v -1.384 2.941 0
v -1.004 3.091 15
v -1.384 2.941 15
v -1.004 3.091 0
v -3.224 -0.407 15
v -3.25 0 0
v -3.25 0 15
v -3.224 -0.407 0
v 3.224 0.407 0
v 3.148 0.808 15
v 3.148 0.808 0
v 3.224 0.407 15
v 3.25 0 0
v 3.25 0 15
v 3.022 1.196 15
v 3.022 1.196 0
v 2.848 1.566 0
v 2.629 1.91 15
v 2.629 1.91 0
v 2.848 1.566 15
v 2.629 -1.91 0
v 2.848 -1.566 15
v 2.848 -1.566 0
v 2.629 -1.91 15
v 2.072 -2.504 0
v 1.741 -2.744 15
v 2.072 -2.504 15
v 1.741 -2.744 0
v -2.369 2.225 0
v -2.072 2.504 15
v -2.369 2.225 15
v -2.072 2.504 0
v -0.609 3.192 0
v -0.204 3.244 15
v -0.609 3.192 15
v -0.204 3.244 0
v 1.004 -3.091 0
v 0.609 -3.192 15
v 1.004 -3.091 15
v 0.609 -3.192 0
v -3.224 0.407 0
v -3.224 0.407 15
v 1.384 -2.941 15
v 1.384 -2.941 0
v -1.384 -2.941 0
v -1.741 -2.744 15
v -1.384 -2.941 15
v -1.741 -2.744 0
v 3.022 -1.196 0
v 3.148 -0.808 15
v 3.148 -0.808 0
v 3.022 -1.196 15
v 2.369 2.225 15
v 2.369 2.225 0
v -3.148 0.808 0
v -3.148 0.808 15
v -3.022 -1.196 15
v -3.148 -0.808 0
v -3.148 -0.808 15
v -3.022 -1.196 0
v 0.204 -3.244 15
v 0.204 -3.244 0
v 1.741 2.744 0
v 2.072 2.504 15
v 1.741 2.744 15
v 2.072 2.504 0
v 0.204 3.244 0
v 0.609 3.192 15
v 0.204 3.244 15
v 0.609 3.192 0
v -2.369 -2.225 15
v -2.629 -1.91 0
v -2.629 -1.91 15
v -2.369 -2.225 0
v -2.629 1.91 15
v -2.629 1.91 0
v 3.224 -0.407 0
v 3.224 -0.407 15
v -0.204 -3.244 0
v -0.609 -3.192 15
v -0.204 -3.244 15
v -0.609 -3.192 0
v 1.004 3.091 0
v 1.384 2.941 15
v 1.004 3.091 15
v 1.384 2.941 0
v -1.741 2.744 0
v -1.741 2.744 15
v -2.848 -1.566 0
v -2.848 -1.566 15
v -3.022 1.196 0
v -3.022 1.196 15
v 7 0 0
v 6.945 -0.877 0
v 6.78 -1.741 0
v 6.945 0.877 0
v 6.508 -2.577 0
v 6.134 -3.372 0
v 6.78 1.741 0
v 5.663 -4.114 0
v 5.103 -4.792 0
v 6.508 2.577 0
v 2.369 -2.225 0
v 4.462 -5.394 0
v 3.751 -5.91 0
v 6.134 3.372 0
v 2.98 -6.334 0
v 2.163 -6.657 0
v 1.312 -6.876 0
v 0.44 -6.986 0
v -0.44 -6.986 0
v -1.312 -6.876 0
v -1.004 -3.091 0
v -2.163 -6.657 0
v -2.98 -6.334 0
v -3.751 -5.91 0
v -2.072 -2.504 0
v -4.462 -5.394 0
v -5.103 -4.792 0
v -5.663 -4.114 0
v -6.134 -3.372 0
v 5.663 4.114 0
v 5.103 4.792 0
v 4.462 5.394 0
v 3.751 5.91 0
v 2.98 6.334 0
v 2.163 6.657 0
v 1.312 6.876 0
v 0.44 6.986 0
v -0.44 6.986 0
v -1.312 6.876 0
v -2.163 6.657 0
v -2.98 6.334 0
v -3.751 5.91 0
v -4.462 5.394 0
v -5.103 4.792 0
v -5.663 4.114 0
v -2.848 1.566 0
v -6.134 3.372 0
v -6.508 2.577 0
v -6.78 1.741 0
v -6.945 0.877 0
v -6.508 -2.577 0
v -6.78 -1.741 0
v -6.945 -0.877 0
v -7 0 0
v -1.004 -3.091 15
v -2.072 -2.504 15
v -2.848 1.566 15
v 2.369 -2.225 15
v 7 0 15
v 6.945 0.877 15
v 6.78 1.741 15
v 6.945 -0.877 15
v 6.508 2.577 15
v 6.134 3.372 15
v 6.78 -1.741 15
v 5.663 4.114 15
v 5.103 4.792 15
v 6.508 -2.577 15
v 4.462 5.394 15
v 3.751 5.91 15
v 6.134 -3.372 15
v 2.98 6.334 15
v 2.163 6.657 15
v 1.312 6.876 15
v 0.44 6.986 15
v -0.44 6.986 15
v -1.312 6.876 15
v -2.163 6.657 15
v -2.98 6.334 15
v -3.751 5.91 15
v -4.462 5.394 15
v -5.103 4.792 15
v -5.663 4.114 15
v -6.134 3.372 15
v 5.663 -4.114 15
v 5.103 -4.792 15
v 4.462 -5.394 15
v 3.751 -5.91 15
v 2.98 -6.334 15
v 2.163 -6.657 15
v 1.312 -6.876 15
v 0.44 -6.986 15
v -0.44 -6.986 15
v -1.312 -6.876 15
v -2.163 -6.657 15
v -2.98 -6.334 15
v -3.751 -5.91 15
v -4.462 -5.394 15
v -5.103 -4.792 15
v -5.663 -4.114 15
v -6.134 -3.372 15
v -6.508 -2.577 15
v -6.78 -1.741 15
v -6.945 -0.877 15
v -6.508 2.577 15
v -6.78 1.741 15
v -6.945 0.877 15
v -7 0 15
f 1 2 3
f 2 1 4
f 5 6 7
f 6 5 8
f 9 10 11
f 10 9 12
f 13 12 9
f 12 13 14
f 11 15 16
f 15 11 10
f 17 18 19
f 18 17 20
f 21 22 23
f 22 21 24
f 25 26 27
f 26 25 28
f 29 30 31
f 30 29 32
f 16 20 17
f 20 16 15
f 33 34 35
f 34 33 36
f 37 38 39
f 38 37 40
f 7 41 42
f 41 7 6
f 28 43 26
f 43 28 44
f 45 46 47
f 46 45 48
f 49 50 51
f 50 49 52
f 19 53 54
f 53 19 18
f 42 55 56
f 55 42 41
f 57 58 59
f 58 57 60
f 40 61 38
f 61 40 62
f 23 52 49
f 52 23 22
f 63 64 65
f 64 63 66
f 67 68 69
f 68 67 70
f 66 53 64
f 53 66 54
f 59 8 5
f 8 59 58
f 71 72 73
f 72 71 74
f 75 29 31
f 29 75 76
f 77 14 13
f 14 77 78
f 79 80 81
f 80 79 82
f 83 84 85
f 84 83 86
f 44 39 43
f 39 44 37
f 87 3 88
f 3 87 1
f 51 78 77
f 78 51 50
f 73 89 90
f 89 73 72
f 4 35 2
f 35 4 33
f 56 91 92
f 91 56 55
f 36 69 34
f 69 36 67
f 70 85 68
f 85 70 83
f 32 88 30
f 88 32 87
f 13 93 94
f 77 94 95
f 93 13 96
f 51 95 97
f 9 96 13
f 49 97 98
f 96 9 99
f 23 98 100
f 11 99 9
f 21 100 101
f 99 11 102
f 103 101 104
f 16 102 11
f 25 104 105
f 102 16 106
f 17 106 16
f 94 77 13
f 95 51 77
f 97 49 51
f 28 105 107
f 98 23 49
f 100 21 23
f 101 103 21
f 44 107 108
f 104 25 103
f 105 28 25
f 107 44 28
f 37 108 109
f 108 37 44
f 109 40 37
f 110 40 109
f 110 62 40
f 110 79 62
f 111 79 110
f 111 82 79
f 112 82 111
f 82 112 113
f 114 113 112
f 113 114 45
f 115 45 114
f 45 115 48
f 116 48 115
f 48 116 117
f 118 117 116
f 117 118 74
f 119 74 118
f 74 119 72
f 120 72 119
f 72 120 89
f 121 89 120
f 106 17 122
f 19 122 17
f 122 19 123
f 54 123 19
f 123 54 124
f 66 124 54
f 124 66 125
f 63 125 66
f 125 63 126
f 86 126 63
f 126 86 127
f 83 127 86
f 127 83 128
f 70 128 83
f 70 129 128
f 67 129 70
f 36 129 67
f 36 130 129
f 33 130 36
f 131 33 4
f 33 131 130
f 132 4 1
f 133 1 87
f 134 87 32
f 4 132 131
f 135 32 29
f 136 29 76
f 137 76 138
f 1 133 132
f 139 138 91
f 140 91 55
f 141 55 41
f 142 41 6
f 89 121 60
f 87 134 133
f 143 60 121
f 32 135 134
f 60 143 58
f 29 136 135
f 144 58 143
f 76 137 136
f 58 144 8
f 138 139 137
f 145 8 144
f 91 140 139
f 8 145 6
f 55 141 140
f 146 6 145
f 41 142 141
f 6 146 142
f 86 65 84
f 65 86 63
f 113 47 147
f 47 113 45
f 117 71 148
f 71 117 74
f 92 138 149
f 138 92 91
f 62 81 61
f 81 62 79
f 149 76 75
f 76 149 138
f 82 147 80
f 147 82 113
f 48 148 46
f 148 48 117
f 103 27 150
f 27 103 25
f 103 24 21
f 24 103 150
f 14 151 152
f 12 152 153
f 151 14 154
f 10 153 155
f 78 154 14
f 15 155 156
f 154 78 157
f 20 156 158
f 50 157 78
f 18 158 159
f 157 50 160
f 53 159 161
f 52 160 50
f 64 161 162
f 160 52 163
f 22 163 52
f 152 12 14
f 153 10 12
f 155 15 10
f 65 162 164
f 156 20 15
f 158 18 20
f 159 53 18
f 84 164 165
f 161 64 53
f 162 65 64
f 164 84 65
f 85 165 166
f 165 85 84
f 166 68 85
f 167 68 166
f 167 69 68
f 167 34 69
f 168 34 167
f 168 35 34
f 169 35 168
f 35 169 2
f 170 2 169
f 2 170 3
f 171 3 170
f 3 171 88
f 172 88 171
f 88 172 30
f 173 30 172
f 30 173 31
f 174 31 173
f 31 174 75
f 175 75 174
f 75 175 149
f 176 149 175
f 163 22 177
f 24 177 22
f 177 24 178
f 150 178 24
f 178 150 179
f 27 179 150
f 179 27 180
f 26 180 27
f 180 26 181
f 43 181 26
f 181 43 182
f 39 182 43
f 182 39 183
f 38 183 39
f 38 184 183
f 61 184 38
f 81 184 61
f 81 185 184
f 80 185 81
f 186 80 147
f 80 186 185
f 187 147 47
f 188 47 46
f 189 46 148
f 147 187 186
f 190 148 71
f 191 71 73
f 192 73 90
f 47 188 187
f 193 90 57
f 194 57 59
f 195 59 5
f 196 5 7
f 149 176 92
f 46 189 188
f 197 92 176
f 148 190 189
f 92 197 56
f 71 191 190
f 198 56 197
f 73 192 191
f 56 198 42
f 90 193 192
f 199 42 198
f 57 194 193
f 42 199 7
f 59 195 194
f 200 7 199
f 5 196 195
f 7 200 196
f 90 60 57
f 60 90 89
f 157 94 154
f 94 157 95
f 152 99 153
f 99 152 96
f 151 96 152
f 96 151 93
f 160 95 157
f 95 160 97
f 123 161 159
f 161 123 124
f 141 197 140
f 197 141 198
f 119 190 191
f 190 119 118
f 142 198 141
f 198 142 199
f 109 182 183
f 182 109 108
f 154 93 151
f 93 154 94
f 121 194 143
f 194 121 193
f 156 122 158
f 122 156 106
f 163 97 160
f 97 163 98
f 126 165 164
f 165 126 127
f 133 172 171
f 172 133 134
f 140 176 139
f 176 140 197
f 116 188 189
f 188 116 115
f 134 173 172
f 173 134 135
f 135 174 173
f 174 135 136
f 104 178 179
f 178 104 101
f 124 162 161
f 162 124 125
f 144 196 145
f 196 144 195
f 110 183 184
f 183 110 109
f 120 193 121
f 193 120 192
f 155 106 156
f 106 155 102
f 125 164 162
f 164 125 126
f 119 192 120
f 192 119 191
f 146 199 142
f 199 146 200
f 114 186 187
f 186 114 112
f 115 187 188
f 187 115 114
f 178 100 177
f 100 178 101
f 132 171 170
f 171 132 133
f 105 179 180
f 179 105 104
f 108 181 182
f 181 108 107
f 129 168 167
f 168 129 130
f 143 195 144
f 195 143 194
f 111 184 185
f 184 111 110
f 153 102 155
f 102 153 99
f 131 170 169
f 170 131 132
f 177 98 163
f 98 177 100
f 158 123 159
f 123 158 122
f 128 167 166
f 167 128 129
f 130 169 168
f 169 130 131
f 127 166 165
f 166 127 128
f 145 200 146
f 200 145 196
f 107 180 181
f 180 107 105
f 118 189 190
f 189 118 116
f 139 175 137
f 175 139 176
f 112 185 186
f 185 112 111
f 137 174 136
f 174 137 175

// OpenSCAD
$fn = 50;


difference() {
	union() {
		cylinder(h = 15, r = 7.0000000000);
	}
	union() {
		cylinder(h = 15, r = 3.2500000000);
		cylinder(h = 15, r = 1.8000000000);
		cylinder(h = 15, r = 1.8000000000);
		cylinder(h = 15, r = 1.8000000000);
	}
}
